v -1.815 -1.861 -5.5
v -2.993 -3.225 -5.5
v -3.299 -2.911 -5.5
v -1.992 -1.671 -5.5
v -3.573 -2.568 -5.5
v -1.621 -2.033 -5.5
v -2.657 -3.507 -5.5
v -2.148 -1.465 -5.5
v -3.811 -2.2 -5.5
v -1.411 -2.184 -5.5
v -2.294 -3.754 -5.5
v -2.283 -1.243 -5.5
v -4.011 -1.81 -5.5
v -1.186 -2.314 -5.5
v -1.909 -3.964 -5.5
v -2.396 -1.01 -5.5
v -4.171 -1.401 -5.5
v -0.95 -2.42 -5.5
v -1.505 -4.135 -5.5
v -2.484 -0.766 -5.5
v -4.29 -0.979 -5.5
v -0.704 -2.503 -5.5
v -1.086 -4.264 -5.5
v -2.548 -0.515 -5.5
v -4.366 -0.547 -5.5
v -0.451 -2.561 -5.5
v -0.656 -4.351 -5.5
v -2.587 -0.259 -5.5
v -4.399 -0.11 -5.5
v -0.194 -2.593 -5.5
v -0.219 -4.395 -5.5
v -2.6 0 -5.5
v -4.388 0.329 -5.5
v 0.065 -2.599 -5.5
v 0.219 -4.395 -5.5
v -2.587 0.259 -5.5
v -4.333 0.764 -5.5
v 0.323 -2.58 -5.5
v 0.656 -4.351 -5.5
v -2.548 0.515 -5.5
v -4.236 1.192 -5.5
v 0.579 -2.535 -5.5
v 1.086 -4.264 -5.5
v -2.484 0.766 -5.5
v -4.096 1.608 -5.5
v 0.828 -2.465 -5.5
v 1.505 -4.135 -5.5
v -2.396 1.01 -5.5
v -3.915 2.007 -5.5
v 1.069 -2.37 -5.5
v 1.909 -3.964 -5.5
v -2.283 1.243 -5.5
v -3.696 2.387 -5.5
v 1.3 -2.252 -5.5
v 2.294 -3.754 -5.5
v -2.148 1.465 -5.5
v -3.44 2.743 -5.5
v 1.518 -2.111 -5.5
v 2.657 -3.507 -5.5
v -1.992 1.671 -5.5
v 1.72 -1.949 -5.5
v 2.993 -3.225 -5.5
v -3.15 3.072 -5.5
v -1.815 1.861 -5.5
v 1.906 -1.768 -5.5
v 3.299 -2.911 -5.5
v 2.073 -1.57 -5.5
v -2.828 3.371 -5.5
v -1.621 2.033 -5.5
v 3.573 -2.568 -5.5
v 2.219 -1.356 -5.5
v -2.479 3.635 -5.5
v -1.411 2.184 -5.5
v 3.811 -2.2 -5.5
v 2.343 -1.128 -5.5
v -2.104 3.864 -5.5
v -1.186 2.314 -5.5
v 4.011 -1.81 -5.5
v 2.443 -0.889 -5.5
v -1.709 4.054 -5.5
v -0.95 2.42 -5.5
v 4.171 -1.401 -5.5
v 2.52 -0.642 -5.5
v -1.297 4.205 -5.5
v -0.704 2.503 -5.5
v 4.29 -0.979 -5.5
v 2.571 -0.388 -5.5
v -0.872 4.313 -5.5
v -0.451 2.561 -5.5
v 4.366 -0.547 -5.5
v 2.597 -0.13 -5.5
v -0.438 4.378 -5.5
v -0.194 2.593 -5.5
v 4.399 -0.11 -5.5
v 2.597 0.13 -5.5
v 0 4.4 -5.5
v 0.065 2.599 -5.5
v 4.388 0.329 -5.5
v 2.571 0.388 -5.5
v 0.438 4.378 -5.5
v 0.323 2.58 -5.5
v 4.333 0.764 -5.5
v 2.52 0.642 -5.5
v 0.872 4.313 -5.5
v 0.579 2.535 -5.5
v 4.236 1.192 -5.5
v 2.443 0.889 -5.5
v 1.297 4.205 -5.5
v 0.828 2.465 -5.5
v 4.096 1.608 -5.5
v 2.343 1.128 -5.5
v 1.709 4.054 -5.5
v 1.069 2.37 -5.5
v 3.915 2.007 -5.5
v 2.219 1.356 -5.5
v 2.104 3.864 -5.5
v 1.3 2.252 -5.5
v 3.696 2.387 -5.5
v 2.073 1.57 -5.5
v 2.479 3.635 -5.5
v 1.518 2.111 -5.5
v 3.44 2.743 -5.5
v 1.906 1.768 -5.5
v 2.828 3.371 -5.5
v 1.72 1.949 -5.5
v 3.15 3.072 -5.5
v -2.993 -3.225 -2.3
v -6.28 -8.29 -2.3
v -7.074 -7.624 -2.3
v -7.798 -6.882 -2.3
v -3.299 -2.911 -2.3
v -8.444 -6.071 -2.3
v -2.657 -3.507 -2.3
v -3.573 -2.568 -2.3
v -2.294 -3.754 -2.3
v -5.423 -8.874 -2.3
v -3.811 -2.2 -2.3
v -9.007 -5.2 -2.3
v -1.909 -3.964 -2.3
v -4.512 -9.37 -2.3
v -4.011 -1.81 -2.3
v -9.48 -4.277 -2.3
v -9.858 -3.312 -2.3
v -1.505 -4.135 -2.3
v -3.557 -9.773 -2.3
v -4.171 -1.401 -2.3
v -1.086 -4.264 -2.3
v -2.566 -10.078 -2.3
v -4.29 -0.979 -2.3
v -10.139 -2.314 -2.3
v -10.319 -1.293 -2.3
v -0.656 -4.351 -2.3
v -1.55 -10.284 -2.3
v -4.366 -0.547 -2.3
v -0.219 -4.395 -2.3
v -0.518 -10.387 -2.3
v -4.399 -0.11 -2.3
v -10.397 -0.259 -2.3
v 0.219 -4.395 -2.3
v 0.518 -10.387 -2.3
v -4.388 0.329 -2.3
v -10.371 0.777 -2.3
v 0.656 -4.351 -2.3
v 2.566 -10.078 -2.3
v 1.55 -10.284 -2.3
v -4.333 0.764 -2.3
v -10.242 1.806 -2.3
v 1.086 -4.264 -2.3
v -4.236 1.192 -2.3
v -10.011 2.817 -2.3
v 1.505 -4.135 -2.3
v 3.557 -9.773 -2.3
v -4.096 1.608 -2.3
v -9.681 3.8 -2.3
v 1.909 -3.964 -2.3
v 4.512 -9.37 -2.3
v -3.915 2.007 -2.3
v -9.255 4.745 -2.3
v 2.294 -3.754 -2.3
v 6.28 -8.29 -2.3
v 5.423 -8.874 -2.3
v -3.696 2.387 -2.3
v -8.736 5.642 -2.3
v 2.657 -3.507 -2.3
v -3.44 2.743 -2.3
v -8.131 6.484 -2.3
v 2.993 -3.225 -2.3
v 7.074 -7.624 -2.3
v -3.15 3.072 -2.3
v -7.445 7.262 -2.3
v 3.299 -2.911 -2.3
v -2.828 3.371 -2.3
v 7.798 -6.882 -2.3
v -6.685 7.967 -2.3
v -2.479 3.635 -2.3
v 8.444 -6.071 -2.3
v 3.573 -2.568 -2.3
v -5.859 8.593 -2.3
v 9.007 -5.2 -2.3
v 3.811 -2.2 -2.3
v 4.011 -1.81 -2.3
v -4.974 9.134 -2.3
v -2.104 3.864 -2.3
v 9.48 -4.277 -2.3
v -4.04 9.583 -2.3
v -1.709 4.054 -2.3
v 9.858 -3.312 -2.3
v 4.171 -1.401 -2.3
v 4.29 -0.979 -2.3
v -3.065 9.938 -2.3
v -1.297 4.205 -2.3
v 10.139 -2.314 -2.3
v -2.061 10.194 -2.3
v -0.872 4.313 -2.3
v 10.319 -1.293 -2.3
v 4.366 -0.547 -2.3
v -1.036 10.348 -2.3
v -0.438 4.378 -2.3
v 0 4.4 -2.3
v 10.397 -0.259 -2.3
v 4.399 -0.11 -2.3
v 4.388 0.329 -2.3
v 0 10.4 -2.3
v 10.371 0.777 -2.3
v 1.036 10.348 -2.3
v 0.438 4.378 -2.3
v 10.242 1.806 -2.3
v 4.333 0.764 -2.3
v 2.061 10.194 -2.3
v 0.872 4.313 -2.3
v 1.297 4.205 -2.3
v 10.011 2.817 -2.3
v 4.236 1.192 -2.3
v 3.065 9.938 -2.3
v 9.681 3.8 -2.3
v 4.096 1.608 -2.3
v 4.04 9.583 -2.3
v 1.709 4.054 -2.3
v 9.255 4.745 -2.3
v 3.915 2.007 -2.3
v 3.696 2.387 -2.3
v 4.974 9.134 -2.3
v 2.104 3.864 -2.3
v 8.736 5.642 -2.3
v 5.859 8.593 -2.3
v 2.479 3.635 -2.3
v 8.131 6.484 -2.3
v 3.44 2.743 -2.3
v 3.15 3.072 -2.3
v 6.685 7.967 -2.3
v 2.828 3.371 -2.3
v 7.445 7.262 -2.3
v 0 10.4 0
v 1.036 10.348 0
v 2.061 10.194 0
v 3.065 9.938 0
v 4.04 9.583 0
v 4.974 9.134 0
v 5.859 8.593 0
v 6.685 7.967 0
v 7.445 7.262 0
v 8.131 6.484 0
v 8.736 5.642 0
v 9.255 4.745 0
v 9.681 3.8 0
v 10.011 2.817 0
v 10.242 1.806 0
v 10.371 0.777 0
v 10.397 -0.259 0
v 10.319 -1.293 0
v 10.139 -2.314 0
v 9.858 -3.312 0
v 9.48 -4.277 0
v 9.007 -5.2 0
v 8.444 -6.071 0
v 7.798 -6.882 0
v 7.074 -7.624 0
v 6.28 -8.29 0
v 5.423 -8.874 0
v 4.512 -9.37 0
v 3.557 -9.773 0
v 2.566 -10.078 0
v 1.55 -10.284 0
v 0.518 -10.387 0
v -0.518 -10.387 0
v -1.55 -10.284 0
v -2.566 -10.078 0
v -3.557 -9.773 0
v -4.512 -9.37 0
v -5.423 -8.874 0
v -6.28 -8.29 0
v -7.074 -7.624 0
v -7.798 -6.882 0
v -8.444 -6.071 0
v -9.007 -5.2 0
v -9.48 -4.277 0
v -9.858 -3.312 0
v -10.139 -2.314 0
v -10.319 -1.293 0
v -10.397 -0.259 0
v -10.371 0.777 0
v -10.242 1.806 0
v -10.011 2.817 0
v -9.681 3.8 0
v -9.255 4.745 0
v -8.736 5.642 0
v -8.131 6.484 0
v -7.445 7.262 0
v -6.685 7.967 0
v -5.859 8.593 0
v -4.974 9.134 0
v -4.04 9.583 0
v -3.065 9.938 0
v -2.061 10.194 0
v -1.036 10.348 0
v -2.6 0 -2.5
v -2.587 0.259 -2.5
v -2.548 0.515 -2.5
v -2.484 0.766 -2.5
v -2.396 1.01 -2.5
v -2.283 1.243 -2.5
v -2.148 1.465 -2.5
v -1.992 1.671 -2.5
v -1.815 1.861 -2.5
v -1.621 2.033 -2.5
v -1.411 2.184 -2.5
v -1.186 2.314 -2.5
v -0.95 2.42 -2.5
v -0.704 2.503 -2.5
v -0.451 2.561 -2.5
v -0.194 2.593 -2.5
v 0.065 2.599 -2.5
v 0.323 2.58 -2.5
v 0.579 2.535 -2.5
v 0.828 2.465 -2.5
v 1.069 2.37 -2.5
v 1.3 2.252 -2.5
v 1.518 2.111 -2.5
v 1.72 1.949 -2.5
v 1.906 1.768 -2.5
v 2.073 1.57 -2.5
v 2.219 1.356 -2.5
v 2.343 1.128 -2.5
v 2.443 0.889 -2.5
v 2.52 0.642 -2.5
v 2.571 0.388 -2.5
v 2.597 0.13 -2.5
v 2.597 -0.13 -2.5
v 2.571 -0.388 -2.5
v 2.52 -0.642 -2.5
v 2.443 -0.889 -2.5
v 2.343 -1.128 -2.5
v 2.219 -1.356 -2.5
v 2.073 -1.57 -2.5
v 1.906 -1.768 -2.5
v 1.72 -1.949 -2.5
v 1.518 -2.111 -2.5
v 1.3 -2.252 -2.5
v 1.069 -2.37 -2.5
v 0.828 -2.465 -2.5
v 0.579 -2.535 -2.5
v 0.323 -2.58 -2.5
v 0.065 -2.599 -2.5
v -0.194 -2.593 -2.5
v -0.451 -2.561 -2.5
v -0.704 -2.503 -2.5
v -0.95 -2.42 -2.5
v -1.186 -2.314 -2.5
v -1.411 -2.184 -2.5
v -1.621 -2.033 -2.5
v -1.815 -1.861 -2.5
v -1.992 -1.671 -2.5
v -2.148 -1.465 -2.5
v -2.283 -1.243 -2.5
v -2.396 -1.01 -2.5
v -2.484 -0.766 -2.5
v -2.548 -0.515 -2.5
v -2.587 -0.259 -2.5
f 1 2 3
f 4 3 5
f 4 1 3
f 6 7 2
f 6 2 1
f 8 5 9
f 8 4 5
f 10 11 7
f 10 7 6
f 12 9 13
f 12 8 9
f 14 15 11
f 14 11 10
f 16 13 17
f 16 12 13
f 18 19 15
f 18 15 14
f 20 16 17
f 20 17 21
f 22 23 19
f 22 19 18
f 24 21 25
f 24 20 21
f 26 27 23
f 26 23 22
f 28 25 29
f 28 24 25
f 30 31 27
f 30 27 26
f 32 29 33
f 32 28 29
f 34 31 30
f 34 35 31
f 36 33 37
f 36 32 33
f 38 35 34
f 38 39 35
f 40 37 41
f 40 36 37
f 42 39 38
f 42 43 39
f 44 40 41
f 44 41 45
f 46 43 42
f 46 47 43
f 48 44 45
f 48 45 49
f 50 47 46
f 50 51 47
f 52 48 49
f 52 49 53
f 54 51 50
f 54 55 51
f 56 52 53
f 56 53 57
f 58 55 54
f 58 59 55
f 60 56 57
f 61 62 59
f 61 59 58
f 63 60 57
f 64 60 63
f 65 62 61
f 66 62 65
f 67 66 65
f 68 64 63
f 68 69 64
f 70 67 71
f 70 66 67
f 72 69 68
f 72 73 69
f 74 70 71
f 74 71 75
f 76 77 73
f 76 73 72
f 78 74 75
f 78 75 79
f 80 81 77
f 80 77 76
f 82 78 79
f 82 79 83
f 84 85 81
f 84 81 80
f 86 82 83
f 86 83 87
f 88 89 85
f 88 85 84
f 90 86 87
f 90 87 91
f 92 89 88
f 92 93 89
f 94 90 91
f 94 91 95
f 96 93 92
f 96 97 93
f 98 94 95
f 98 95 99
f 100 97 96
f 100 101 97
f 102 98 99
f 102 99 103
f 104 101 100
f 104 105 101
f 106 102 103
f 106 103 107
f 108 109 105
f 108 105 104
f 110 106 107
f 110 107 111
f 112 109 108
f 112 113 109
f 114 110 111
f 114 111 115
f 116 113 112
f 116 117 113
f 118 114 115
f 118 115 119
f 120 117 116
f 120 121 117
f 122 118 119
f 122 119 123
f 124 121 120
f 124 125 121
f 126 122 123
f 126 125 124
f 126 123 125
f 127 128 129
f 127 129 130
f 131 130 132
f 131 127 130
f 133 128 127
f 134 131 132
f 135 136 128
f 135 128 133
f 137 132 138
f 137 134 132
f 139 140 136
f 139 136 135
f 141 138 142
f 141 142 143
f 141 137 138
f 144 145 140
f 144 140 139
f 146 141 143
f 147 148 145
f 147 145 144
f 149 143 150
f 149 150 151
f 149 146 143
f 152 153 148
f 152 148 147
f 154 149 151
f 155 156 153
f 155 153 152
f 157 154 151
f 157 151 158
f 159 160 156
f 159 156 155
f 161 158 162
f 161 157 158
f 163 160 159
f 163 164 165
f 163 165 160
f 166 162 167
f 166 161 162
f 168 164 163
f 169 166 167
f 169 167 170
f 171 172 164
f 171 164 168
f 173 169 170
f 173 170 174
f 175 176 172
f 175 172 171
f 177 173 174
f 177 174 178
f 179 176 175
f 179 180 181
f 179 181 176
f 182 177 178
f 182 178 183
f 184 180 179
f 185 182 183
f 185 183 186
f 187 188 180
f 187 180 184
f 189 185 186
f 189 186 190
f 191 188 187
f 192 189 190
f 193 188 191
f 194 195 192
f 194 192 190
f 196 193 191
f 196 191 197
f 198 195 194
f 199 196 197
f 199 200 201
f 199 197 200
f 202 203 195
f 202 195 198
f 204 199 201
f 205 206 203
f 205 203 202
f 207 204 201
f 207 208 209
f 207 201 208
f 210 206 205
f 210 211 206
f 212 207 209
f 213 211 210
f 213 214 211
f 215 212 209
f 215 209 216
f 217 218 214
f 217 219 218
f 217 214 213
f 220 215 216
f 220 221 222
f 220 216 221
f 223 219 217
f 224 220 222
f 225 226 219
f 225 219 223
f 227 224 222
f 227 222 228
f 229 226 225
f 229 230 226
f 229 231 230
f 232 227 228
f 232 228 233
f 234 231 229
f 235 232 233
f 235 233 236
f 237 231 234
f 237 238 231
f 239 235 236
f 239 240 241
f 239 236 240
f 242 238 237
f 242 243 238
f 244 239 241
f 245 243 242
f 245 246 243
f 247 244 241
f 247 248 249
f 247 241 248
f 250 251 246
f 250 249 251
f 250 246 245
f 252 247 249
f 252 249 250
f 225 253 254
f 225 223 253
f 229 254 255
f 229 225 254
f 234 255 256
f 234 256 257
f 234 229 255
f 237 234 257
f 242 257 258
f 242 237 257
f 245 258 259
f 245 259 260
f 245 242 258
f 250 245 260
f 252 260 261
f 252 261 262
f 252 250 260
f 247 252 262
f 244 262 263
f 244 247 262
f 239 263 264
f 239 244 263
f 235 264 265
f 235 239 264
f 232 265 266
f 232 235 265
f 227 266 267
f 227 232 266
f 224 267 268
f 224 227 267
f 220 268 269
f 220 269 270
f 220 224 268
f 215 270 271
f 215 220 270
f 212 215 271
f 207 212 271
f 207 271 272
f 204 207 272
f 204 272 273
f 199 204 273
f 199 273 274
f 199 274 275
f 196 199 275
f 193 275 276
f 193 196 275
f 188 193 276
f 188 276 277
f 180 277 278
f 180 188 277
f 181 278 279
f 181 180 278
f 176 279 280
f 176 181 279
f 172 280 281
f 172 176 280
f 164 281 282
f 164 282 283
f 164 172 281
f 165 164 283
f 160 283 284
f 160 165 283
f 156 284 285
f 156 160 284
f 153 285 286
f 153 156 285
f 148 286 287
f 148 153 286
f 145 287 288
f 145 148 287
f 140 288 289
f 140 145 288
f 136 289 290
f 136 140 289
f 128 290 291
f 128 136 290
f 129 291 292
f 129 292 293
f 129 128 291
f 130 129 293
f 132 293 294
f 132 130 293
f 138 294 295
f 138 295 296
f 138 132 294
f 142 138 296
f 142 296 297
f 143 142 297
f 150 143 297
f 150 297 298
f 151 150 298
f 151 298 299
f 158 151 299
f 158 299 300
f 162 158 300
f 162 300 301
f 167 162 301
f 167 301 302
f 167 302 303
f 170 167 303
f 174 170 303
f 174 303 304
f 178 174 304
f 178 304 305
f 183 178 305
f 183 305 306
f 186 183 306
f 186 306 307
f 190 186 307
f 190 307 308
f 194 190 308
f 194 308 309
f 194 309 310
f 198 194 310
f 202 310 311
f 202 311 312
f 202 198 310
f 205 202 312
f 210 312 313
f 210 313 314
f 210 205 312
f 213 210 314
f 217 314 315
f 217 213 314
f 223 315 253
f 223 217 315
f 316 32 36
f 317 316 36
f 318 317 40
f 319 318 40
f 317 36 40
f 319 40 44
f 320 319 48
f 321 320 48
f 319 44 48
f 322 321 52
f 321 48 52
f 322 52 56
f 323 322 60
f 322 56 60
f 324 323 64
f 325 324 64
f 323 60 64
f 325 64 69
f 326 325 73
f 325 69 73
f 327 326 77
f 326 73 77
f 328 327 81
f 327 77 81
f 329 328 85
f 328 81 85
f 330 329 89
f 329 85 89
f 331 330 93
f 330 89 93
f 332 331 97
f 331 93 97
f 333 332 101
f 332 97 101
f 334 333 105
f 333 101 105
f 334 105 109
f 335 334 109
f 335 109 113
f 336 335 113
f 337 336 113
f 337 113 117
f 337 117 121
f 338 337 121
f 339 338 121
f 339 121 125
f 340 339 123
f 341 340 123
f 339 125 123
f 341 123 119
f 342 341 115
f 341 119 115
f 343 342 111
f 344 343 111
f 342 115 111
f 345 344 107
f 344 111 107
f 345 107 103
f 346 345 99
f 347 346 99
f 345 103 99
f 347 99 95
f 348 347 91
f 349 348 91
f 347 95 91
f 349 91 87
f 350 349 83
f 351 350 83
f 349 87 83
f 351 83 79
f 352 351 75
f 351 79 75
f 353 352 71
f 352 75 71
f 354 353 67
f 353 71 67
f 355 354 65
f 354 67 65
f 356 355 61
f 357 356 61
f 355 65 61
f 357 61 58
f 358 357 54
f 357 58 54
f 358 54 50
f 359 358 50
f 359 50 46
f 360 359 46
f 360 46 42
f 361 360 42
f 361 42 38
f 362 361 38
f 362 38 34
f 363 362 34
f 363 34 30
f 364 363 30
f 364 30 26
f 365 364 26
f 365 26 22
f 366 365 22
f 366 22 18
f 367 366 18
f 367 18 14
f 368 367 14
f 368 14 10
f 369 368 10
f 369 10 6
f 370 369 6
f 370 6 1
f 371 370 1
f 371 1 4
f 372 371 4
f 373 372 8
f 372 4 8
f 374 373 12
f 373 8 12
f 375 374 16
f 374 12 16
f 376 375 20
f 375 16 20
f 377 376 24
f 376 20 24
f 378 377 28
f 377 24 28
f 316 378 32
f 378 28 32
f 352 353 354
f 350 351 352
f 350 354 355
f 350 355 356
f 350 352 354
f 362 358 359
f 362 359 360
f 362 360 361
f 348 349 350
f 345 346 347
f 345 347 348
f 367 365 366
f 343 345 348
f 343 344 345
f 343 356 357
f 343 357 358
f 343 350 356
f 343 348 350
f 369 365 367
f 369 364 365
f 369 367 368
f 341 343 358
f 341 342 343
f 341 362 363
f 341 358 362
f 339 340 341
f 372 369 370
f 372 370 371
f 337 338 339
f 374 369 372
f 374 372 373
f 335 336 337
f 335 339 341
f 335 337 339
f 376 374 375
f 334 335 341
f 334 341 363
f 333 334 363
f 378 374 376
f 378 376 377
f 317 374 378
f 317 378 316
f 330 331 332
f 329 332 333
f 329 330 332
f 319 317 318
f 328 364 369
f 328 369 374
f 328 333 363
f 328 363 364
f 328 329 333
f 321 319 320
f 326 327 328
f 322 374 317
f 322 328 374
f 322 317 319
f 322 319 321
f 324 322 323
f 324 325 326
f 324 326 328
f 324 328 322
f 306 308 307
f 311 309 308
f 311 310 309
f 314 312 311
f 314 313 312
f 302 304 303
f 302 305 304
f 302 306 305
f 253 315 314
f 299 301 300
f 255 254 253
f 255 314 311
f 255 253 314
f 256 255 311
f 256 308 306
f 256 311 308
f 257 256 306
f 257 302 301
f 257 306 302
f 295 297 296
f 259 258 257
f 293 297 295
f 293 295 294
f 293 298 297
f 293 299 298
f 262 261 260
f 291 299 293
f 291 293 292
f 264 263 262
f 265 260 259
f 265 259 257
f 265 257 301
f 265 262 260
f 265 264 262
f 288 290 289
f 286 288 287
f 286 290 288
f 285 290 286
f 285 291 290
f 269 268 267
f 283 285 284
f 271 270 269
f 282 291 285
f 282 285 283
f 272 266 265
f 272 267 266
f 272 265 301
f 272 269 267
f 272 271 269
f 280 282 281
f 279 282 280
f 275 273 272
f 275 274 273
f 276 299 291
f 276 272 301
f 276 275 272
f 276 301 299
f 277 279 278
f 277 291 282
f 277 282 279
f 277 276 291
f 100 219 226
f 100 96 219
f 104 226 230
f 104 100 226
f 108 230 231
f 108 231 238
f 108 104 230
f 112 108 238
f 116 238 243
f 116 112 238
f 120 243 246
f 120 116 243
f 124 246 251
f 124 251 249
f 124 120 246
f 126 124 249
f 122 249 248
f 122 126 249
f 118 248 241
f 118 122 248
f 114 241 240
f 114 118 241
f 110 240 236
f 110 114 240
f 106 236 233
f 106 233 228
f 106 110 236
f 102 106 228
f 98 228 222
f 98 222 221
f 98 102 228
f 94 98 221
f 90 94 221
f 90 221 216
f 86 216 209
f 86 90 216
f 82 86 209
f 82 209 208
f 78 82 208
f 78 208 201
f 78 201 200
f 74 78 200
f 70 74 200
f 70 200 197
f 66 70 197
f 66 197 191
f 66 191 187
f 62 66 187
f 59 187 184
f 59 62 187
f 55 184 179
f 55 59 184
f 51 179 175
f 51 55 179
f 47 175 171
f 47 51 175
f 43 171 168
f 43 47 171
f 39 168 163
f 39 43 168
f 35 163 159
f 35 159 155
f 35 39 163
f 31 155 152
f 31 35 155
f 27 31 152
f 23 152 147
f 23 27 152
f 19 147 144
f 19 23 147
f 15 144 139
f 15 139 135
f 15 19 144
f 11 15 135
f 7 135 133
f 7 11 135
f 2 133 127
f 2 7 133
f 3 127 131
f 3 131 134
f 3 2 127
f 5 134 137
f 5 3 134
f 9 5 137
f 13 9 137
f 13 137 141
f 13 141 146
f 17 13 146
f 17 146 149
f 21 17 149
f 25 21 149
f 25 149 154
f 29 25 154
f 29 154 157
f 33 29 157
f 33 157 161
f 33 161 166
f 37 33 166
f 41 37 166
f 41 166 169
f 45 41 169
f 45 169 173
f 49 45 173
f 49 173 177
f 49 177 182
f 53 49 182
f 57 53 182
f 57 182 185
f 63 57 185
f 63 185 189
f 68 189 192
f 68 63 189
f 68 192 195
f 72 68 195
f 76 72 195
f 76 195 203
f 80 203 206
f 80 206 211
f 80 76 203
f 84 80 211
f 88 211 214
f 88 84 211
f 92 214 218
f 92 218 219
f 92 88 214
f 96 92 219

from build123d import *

# Parameters (mm, degrees)
SKETCH_2_R          = 2.6
CUT_EXTRUDE_1_DEPTH = 3


with BuildPart() as part:
    # 草图1 → 旋转1 (revolve)
    with BuildSketch(Plane(origin=(0, 0, 0), x_dir=(0, 0, -1), z_dir=(1, 0, 0))):
        Polygon((0, 10.4), (2.3, 10.4), (2.3, 4.4), (5.5, 4.4), (5.5, 0), (0, 0), align=None)
    revolve(axis=Axis((0, 0, 0), (0, 0, -1)))

    # 草图2 → 切除-拉伸1 (cut)
    with BuildSketch(Plane(origin=(0, 0, -5.5), x_dir=(-1, 0, 0), z_dir=(0, 0, -1))):
        Circle(SKETCH_2_R)
    extrude(amount=-CUT_EXTRUDE_1_DEPTH, mode=Mode.SUBTRACT)


solid = part.part
